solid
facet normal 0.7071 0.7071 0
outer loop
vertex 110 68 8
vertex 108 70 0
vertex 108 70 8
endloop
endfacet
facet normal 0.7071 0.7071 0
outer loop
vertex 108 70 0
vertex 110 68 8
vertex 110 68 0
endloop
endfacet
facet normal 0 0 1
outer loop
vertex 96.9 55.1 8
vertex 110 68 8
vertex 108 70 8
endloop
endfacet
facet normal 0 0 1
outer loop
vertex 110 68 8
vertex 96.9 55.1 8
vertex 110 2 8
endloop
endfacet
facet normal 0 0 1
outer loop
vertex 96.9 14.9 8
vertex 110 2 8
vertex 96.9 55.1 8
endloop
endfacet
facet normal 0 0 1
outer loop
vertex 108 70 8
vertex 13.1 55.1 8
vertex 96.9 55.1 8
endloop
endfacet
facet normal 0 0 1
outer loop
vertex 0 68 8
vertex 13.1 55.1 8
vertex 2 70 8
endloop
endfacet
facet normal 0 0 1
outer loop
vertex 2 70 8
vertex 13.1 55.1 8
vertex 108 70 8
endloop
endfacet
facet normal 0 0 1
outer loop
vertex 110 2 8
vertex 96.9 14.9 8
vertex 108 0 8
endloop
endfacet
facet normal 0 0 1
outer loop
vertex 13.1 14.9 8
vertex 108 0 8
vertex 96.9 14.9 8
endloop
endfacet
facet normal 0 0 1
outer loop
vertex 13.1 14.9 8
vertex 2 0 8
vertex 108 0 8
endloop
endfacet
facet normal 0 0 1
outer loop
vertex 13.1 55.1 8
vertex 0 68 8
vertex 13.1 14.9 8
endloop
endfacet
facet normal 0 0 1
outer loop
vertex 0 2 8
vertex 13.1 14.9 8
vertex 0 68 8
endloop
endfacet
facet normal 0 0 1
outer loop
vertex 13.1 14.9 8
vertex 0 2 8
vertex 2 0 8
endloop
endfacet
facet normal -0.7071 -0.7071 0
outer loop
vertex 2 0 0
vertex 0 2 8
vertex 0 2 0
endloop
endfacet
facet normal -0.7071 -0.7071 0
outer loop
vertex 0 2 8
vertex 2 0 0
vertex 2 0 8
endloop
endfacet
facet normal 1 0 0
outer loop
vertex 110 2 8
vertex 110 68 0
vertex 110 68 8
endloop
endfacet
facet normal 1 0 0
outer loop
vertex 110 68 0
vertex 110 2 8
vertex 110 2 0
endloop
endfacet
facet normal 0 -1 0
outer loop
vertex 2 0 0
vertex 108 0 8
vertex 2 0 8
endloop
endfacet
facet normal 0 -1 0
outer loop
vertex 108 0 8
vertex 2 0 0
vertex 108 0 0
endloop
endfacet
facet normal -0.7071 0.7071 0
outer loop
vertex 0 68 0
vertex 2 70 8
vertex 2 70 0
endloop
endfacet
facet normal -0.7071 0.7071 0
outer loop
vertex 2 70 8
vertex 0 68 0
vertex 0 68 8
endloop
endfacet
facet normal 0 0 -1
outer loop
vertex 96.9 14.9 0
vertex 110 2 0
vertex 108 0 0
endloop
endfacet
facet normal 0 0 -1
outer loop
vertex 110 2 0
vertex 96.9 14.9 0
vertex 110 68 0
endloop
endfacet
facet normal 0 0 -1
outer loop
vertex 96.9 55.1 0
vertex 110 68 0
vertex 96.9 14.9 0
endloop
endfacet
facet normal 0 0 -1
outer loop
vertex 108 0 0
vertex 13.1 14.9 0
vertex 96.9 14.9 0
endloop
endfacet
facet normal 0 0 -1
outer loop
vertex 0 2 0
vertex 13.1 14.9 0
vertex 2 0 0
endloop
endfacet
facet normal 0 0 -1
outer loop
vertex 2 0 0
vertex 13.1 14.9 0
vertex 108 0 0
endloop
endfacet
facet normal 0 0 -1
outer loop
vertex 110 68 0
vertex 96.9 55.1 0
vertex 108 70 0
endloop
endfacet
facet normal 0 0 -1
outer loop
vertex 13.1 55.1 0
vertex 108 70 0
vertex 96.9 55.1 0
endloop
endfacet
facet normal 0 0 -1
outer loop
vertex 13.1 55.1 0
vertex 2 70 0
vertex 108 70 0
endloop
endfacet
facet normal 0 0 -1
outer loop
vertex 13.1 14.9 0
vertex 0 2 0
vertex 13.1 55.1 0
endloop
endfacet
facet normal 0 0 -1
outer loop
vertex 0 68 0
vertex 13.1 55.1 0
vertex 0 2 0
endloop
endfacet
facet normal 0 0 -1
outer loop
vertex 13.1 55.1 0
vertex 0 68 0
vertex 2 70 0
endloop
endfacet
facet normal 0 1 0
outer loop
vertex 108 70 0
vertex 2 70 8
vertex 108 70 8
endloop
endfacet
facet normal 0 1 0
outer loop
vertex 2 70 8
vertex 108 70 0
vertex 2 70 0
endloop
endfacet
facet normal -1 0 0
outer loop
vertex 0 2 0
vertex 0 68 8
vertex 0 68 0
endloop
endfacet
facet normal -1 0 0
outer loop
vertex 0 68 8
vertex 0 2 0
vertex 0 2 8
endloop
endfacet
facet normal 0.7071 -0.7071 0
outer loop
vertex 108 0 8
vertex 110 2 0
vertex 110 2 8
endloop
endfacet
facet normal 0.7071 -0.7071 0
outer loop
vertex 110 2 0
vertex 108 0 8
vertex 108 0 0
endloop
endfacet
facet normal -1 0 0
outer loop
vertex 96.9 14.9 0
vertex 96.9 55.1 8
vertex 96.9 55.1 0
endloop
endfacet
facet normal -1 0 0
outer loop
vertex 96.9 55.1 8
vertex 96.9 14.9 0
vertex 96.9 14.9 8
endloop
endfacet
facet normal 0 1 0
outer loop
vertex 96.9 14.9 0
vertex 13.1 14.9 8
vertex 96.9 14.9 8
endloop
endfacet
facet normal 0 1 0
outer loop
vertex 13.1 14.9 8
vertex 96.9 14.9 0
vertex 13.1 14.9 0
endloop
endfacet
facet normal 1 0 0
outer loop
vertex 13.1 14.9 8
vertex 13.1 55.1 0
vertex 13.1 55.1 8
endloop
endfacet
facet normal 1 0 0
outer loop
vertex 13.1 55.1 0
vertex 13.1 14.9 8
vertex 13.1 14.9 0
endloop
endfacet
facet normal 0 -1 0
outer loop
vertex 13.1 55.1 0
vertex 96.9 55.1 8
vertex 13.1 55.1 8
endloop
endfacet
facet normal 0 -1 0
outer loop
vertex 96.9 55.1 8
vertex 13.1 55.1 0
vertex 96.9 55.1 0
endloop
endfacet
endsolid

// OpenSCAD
$fn = 32;

// ----------------------------------------------------------------------
// Windowed plate: 1 voids, 110 x 70 x 8 mm
// ----------------------------------------------------------------------

// --- parameters (mm) ---
plate_l = 110;            // plate length, X
plate_w = 70;             // plate width, Y
plate_t = 8;              // plate thickness, Z
edge_margin = 10;         // wall from the plate edge to any window
win1_l = 83.8;            // window length
win1_w = 40.2;            // window width
depth_1 = 8;              // depth of void 1 (full thickness = through)
corner_c = 2;             // corner chamfer of the plate
fit_tol = 0.1;            // declared fit tolerance (prompt contract)
free_tol = 0.3;           // declared free tolerance (prompt contract)

profile = [[2, 0], [108, 0], [110, 2], [110, 68], [108, 70], [2, 70], [0, 68], [0, 2]];  // primary outline, 8 points, counter clockwise
void_1 = [[13.1, 14.9], [96.9, 14.9], [96.9, 55.1], [13.1, 55.1]];  // large central window, 4 points

// --- the one profile operation ---
difference() {
  linear_extrude(height = plate_t) polygon(points = profile);
  translate([0, 0, -1])
    linear_extrude(height = plate_t + 2) polygon(points = void_1);
}
